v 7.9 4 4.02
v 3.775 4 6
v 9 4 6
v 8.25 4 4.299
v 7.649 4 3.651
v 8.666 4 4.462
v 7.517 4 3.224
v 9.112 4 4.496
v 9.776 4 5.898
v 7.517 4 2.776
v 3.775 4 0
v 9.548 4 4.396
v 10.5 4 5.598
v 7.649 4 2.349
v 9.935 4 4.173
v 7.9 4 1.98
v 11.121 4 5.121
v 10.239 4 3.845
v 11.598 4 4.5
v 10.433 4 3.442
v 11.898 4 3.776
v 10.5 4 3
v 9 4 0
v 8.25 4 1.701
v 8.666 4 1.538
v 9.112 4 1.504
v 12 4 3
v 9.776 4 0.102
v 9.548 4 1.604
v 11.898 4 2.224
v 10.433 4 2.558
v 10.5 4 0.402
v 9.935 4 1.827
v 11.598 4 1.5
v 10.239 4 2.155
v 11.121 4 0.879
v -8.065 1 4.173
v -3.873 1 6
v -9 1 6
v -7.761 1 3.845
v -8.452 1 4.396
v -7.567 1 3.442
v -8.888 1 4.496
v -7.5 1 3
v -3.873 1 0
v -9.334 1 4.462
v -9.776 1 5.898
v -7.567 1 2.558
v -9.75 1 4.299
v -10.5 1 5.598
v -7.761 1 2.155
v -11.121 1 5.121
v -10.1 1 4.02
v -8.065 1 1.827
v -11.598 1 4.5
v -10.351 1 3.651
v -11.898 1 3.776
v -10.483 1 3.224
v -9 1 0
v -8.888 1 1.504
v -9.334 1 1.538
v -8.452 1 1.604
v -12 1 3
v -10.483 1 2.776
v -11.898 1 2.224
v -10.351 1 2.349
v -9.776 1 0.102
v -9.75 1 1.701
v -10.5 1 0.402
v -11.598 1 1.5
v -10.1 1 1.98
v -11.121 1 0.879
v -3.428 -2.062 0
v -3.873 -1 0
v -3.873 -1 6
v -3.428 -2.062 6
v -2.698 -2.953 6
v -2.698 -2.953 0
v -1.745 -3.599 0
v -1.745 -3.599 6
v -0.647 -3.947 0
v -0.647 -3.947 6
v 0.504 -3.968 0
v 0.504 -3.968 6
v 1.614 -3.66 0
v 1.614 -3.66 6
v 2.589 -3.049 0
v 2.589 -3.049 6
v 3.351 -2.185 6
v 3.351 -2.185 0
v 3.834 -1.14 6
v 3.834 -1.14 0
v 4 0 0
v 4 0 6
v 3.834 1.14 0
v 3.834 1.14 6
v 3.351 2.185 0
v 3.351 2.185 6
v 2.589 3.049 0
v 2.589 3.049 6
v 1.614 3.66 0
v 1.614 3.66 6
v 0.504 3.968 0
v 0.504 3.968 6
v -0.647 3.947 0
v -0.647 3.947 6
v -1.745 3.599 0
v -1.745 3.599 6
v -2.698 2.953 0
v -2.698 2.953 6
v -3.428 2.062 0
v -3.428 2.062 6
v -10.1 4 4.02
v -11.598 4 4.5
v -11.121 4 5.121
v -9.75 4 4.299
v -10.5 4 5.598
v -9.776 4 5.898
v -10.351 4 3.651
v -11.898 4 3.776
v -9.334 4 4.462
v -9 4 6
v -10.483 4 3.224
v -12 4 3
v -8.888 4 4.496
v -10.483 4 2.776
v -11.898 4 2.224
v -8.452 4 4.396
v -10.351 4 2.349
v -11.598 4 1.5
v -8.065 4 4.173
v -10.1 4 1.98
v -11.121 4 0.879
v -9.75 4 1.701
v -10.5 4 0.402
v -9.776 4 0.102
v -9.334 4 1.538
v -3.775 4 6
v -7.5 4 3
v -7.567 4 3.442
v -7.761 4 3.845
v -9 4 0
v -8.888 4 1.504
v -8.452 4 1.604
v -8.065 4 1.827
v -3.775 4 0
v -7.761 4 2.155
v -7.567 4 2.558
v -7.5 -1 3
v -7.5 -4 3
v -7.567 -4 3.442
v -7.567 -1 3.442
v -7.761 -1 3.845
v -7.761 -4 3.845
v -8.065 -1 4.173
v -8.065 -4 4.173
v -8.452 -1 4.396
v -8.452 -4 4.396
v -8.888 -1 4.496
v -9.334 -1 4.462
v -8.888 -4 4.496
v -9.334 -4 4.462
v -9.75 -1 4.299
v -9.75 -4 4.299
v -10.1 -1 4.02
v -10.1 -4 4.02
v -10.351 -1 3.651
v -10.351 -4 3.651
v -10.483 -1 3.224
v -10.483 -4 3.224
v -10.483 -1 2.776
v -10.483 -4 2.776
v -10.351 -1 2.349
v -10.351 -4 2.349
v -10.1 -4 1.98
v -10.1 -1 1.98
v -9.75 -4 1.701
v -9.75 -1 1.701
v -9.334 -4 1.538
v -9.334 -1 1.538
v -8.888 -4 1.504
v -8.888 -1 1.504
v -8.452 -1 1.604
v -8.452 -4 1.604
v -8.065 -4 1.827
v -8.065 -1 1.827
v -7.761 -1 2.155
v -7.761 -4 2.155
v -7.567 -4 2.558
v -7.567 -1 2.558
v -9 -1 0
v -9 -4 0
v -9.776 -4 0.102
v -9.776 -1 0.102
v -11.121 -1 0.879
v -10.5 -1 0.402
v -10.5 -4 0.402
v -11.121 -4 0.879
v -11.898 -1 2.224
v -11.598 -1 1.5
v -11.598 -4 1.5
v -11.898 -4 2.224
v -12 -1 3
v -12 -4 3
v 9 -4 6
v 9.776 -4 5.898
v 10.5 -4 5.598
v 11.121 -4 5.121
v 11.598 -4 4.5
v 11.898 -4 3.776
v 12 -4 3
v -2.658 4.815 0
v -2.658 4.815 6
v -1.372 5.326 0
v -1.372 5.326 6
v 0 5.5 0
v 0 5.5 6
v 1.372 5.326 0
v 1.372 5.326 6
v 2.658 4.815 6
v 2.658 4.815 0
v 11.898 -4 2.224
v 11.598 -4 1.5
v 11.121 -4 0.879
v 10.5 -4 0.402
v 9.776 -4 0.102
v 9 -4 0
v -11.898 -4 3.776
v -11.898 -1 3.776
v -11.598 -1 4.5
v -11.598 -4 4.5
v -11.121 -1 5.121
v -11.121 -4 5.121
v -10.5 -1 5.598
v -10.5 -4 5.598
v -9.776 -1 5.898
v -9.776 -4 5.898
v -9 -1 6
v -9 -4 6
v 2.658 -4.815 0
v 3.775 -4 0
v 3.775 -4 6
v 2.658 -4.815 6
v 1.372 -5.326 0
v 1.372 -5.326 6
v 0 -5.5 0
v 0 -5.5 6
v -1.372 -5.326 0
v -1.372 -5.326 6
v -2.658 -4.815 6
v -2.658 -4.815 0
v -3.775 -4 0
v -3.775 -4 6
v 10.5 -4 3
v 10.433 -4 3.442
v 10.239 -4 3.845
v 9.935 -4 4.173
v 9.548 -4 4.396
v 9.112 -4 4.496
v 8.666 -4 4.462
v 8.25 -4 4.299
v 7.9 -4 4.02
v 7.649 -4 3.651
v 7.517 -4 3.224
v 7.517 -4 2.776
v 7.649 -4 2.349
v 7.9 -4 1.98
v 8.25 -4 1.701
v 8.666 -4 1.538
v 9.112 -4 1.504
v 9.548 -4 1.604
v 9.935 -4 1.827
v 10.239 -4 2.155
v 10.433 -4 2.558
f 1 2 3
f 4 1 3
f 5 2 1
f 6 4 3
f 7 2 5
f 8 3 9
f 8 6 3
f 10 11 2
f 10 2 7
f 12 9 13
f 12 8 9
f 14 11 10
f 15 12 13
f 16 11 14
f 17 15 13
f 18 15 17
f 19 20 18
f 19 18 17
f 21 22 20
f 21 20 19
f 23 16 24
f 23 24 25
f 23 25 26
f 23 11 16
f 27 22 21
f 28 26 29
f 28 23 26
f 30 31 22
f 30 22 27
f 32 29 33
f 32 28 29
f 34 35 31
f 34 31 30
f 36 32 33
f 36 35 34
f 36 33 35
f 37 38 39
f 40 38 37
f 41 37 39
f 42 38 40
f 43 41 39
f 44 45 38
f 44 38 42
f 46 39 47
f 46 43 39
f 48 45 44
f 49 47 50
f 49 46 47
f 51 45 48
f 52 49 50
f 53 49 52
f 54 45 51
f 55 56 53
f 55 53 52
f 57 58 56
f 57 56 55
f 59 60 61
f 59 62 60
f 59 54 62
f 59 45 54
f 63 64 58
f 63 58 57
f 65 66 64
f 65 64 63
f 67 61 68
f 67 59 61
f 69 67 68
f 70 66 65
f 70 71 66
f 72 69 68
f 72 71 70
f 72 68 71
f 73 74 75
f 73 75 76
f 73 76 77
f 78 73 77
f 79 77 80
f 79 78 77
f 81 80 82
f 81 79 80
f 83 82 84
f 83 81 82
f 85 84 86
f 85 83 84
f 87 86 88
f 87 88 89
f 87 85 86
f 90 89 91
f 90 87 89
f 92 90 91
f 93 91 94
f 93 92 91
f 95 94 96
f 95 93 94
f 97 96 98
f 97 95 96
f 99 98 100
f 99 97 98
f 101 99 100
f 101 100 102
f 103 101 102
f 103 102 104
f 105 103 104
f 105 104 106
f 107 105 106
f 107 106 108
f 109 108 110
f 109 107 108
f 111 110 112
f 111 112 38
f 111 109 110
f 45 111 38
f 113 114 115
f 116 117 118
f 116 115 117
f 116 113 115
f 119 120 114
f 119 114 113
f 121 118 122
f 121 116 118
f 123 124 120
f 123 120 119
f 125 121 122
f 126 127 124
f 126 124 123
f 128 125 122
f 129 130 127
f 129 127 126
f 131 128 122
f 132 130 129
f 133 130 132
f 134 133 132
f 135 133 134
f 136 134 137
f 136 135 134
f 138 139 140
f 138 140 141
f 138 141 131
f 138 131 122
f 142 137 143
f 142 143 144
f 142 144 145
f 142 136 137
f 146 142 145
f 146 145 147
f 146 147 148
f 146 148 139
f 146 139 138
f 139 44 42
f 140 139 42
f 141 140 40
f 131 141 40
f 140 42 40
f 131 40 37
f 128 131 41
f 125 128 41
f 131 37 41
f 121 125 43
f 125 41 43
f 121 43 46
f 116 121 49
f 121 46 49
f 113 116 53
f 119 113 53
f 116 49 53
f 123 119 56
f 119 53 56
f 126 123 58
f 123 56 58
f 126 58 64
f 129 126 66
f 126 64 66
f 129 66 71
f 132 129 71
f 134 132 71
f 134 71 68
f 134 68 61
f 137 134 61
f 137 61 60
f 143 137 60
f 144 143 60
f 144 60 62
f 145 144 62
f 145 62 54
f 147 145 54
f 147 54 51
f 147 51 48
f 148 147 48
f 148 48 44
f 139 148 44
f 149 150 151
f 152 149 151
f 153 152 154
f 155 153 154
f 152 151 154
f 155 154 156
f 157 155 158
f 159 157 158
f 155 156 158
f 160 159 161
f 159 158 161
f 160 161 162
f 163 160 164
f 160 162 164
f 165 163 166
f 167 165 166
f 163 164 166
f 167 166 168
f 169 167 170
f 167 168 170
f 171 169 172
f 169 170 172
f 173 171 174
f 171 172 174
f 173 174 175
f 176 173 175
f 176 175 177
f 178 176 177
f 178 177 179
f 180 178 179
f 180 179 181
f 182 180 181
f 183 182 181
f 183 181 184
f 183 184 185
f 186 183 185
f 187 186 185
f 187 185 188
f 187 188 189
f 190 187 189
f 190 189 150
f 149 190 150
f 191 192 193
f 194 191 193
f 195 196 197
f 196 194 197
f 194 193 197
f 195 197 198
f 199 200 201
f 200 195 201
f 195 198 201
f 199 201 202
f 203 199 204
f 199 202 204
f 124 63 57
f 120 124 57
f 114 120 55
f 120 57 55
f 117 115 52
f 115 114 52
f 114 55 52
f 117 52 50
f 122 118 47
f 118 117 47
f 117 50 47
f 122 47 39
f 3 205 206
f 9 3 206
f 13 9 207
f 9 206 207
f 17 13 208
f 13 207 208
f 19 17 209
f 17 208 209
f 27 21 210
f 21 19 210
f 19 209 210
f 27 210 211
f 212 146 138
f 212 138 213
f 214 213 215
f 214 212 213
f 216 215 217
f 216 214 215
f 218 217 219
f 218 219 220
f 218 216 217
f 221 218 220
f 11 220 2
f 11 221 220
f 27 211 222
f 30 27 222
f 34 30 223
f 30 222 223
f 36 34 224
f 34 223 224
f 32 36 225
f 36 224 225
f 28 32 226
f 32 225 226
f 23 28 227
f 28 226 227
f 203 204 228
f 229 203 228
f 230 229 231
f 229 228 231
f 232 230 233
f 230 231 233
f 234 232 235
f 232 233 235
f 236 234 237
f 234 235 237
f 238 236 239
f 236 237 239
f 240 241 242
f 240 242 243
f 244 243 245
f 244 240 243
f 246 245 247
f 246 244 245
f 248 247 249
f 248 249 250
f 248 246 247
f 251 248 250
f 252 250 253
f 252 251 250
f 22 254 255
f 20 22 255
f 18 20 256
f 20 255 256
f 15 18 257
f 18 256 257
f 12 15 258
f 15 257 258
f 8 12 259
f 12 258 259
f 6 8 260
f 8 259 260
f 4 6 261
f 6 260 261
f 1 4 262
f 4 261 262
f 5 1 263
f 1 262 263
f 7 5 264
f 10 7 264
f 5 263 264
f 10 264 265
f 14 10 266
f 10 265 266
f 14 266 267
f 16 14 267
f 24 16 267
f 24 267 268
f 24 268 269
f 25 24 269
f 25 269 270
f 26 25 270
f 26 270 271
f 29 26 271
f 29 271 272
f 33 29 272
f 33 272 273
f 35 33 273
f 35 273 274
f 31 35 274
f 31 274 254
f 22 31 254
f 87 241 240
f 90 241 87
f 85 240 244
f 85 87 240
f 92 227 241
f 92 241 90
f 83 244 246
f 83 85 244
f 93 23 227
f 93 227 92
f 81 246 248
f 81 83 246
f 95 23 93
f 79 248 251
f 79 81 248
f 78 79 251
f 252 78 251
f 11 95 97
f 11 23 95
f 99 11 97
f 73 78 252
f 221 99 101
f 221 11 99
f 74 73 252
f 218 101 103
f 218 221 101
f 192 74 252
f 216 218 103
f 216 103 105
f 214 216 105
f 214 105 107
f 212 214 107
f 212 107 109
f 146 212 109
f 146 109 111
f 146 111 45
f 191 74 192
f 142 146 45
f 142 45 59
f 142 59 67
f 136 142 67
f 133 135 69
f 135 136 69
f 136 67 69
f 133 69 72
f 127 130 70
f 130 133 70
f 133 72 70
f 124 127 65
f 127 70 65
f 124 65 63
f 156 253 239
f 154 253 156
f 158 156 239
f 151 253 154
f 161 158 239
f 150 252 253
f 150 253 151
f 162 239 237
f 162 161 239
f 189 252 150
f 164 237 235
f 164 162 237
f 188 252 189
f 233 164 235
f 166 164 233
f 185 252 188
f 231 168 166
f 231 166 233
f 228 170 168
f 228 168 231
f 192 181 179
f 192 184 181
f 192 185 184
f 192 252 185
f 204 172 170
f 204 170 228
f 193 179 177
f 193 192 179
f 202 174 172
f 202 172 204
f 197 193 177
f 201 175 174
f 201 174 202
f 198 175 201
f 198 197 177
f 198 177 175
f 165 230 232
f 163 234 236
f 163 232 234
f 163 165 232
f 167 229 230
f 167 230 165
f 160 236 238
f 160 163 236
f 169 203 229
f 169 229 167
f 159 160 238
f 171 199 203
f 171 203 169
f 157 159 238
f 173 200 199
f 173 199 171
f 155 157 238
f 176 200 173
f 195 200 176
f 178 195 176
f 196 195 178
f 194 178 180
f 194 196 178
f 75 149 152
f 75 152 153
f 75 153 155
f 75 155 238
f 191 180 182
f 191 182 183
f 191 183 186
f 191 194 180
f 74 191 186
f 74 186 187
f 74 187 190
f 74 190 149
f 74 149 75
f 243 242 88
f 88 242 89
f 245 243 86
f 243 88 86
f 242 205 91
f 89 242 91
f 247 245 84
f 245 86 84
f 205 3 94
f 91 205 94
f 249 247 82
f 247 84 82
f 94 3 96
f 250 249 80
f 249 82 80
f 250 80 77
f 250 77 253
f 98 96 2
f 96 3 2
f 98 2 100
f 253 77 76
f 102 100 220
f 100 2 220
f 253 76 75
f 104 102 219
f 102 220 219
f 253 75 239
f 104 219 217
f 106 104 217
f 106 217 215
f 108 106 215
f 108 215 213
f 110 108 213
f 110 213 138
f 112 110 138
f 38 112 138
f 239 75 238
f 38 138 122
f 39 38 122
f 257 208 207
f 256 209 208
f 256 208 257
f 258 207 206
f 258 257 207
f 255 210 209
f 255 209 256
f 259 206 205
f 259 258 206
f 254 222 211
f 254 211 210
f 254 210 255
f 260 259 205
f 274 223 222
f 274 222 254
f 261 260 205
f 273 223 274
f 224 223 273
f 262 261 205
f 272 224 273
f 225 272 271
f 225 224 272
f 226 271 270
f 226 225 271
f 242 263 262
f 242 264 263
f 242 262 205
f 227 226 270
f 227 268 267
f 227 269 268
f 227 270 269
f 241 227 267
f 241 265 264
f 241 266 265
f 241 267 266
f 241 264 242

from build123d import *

# Parameters (mm, degrees)
EXTRUDE_1_DEPTH     = 6
CUT_EXTRUDE_1_DEPTH = 10.5
SKETCH_3_R          = 1.5
CUT_EXTRUDE_2_DEPTH = 10.5


with BuildPart() as part:
    # 草图1 → 凸台-拉伸1 (new body)
    with BuildSketch(Plane.XY):
        with BuildLine():
            Line((12, 4), (12, -4))
            Line((12, -4), (3.774917218, -4))
            ThreePointArc((3.774917218, -4), (0, -5.5), (-3.774917218, -4))
            Line((-3.774917218, -4), (-12, -4))
            Line((-12, -4), (-12, -1))
            Line((-12, -1), (-3.872983346, -1))
            ThreePointArc((-3.872983346, -1), (4, 0), (-3.872983346, 1))
            Line((-3.872983346, 1), (-12, 1))
            Line((-12, 1), (-12, 4))
            Line((-12, 4), (-3.774917218, 4))
            ThreePointArc((-3.774917218, 4), (0, 5.5), (3.774917218, 4))
            Line((3.774917218, 4), (12, 4))
        make_face()
    extrude(amount=EXTRUDE_1_DEPTH)

    # 草图2 → 切除-拉伸1 (cut, through all)
    with BuildSketch(Plane.XZ.offset(4)):
        with BuildLine():
            ThreePointArc((-9, 0), (-11.121320344, 0.878679656), (-12, 3))
            Line((-12, 3), (-12, 0))
            Line((-12, 0), (-9, 0))
        make_face()
        with BuildLine():
            Line((-9, 6), (-12, 6))
            Line((-12, 6), (-12, 3))
            ThreePointArc((-12, 3), (-11.121320344, 5.121320344), (-9, 6))
        make_face()
        with BuildLine():
            Line((12, 0), (12, 3))
            ThreePointArc((12, 3), (11.121320344, 0.878679656), (9, 0))
            Line((9, 0), (12, 0))
        make_face()
        with BuildLine():
            Line((12, 6), (9, 6))
            ThreePointArc((9, 6), (11.121320344, 5.121320344), (12, 3))
            Line((12, 3), (12, 6))
        make_face()
    extrude(amount=-CUT_EXTRUDE_1_DEPTH, mode=Mode.SUBTRACT)

    # 草图3 → 切除-拉伸2 (cut, through all)
    with BuildSketch(Plane.XZ.offset(4)):
        with Locations((-9, 3)):
            Circle(SKETCH_3_R)
        with Locations((9, 3)):
            Circle(SKETCH_3_R)
    extrude(amount=-CUT_EXTRUDE_2_DEPTH, mode=Mode.SUBTRACT)


solid = part.part
